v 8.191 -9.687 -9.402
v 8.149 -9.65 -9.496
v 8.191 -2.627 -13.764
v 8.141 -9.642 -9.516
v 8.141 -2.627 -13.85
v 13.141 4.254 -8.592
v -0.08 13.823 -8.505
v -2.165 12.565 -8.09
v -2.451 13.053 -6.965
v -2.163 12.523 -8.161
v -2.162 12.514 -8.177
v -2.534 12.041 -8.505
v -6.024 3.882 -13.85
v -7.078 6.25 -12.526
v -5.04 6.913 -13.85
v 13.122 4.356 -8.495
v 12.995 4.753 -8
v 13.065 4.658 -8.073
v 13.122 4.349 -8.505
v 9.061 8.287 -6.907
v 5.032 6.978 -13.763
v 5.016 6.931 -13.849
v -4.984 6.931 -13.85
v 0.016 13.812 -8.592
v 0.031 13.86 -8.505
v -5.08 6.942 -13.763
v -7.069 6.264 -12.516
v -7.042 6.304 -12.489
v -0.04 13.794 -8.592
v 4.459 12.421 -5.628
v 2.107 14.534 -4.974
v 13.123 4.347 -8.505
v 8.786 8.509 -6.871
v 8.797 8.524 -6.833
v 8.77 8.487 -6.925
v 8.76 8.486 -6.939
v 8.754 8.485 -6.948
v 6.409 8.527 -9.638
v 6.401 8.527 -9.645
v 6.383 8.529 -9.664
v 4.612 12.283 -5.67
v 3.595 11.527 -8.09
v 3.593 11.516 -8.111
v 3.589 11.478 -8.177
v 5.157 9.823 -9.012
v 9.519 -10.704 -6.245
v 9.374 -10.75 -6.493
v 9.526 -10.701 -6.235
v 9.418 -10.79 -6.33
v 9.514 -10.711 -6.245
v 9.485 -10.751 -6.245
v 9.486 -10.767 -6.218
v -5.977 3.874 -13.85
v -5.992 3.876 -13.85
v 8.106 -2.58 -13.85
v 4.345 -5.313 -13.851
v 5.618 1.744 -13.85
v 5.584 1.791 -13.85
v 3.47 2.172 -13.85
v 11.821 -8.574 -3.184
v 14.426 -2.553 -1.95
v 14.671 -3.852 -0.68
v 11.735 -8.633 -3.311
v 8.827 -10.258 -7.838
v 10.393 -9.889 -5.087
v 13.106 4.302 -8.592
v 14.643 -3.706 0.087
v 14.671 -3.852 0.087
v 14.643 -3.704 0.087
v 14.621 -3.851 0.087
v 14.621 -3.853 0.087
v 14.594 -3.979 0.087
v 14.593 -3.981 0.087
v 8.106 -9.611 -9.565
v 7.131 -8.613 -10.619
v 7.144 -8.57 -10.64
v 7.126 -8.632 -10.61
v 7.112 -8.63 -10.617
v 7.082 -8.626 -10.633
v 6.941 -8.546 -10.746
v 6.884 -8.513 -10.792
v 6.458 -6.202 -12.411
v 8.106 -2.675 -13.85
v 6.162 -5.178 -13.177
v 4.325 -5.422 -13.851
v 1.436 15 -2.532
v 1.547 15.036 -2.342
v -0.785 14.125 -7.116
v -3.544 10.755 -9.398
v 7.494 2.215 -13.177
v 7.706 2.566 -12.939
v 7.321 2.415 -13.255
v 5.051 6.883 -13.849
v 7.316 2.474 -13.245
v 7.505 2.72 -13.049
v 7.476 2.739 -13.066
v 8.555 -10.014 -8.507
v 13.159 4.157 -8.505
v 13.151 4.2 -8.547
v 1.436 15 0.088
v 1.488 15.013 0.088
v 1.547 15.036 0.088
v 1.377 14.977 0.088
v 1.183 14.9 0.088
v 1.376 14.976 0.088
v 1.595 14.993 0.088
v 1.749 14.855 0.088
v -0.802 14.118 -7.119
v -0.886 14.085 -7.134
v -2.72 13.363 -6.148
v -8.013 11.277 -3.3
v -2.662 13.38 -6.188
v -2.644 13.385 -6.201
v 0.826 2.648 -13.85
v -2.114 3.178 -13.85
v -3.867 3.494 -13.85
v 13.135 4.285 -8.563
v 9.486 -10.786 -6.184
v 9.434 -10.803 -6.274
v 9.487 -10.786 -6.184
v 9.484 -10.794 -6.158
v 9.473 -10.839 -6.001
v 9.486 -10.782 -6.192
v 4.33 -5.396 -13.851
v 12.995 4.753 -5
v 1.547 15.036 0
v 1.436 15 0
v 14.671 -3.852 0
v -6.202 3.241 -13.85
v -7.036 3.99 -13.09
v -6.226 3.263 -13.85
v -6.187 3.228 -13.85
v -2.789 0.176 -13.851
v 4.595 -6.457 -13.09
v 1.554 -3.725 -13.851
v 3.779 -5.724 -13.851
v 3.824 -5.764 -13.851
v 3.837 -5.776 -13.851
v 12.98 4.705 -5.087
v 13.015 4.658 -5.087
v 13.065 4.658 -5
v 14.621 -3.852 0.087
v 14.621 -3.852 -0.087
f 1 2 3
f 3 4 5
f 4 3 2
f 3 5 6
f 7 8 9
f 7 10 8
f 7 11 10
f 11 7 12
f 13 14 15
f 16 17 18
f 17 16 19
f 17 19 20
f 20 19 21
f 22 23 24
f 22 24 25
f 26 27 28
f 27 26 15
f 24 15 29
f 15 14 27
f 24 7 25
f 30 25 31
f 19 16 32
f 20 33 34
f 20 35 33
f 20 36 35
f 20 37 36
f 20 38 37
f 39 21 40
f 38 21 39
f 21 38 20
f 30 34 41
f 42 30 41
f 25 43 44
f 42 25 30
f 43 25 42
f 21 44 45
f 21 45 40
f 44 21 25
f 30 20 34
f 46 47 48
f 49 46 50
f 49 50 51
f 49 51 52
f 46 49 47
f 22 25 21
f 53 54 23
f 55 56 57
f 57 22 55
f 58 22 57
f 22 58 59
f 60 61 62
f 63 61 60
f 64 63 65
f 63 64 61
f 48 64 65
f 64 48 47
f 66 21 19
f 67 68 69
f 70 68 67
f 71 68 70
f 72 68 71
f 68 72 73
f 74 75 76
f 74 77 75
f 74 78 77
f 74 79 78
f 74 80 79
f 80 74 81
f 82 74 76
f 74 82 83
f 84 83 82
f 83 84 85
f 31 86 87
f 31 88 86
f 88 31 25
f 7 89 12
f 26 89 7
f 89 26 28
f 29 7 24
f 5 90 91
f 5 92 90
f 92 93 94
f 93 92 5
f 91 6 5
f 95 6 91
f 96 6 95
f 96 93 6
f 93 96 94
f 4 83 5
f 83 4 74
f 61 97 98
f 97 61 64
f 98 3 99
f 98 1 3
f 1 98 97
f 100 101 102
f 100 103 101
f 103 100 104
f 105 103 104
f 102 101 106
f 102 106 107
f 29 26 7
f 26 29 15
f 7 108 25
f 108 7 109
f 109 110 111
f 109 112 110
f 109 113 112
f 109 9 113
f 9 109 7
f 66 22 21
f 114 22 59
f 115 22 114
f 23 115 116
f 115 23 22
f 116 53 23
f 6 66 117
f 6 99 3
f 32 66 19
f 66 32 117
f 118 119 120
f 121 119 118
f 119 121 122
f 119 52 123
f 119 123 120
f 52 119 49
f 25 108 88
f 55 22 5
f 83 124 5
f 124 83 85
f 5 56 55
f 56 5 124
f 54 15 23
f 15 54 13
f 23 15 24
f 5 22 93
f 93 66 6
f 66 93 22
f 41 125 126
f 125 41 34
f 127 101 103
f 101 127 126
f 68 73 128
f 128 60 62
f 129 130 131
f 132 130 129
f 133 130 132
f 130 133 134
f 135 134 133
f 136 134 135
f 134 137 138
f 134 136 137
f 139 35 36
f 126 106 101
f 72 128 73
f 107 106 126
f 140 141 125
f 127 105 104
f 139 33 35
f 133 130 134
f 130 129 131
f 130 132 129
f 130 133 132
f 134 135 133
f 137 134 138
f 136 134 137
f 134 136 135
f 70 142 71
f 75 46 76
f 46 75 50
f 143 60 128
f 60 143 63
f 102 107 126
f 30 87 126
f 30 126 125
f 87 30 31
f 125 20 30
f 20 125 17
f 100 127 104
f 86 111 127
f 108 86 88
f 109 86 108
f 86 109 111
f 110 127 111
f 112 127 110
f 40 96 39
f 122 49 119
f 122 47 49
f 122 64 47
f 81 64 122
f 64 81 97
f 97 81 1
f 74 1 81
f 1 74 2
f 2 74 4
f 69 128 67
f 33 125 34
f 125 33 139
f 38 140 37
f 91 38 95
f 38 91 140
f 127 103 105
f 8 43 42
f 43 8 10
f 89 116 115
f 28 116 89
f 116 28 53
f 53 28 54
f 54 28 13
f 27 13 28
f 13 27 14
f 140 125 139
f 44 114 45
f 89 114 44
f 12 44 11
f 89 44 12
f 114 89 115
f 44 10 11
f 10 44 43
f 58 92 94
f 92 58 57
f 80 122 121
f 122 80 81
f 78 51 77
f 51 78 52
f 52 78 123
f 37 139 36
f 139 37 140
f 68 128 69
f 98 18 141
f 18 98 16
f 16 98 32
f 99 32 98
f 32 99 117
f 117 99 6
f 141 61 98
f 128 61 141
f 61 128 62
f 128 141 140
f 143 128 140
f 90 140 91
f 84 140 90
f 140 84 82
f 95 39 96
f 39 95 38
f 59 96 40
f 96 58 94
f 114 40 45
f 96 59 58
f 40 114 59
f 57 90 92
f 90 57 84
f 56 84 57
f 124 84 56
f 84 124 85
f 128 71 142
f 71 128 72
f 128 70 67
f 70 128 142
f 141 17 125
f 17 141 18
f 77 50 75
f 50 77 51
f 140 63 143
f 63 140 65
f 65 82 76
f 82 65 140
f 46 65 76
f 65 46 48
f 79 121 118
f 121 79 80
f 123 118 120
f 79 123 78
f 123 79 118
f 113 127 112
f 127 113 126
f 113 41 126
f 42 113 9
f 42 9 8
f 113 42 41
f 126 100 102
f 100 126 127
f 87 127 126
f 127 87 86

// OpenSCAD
// Auto-generated OpenSCAD file

    inner_points = 10*[[-1.2800868421421776, 0.9300375234937233, -0.4999999999986175], [1.00952842451697, -1.126609720368595, 0.4999999999986175], [0.7495811565537936, 0.25032633822332373, -1.309016994373636], [0.5889249096677321, 1.1013196227617108, 0.8090169943779234], [-0.39522647677644196, 1.2786499601524015, -0.8090169943722536], [-1.2800868421428393, 0.930037523491642, 0.5000000000013824], [-0.8428092367899453, 0.5372528513524985, -1.309016994374093], [1.4571111845311355, -0.3852126115666106, 4.568012634820207e-13], [0.572250819164738, -0.7338250482273702, 1.309016994374093], [1.0095284245176321, -1.1266097203665137, -0.5000000000013824], [0.15164730431657092, 1.494104294906303, 3.5040581547463034e-12], [-0.3952264767775129, 1.2786499601490338, 0.8090169943776411], [1.2964549376461445, 0.46578067297514414, 0.5000000000021215], [0.7495811565520609, 0.25032633821787476, 1.3090169943762586], [0.5889249096688031, 1.1013196227650786, -0.8090169943719714], [-0.8428092367916781, 0.5372528513470497, 1.3090169943758017], [-0.13527920881153285, -0.09828609843406824, -1.6180339887498947], [1.2964549376468066, 0.4657806729772256, -0.49999999999787836], [-0.13527920881367453, -0.09828609844080341, 1.6180339887498947], [0.5722508191664707, -0.7338250482219214, -1.3090169943758017]];

    outer_points = 10*[[1.6180339861193813, 0.0, 9.226332282866825e-05], [-1.6180339861193813, 0.0, -9.226332282866825e-05], [4.8497926242127776e-05, 1.3764661599662604, -0.8505144895094868], [7.848867363894099e-05, -0.850514490892208, -1.3764661577284751], [1.3090654955439587, 0.4254096483352815, -0.8505340370787032], [1.3090169976177166, -0.9510565116309789, -1.9547569216365145e-05], [1.309016986875918, 0.9510565116309789, 0.00016883276146815448], [-1.308968488949676, 0.4254096483352815, -0.850683322270955], [-1.309016986875918, -0.9510565116309789, -0.00016883276146815448], [-1.3090169976177166, 0.9510565116309789, 1.9547569216365145e-05], [0.8090954784139313, -0.2627292414823533, -1.3763618133434734], [0.8090655050471297, -1.113432112705552, -0.8507149509023446], [-0.8089385077054501, -0.2627292414823533, -1.3764540766663023], [-0.8089684810722516, -1.113432112705552, -0.8508072142251732], [0.5000784791704679, 0.6883272701486257, -1.3762852439048336], [0.5000000078774243, -1.5388417610408336, -0.00012389195421817631], [0.49999999049682897, 1.5388417610408336, 0.00018091382364129736], [-0.4999215192037853, 0.6883272701486257, -1.3763422657742568], [-0.49999999049682897, -1.5388417610408336, -0.00018091382364129736], [-0.5000000078774243, 1.5388417610408336, 0.00012389195421817631]];

    // Convex hull for inner set (I)
    module inner_hull() {
        hull() {
            for (p = inner_points) {
                translate(p) sphere(r=0.1);
            }
        }
    }

    // Convex hull for outer set (O) minus inner hull (O \ I)
    module outer_minus_inner() {
        difference() {
            hull() {
                for (p = outer_points) {
                    translate(p) sphere(r=0.1);
                }
            }
            inner_hull(); // Subtract inner hull
        }
    }

    // Convex hull for outer set (O) minus all translated inner hulls
    module outer_minus_AllTranslationInner() {
        difference() {
            hull() {
                for (p = outer_points) {
                    translate(p) sphere(r=0.1);
                }
            }
            hull() {
                translate([0,0,50]) inner_hull();
                translate([0,0,-50]) inner_hull();
            }; // Subtract translated inner hulls
        }
    }

    // Difference between outer_minus_inner and outer_minus_AllTranslationInner
    module outer_minus_inner_diff() {
        difference() {
            // Outer minus inner
            difference() {
                hull() {
                    for (p = outer_points) {
                        translate(p) sphere(r=0.1);
                    }
                }
                inner_hull();
            }

            // Subtract Outer minus AllTranslationInner
            difference() {
                hull() {
                    for (p = outer_points) {
                        translate(p) sphere(r=0.1);
                    }
                }
                hull() {
                    translate([0,0,50]) inner_hull();
                    translate([0,0,-50]) inner_hull();
                };
            }
        }
    }

    // Rendering all with colors applied
    color([1, 1, 0, 1]) outer_minus_inner_diff(); // Opaque yellow
    
